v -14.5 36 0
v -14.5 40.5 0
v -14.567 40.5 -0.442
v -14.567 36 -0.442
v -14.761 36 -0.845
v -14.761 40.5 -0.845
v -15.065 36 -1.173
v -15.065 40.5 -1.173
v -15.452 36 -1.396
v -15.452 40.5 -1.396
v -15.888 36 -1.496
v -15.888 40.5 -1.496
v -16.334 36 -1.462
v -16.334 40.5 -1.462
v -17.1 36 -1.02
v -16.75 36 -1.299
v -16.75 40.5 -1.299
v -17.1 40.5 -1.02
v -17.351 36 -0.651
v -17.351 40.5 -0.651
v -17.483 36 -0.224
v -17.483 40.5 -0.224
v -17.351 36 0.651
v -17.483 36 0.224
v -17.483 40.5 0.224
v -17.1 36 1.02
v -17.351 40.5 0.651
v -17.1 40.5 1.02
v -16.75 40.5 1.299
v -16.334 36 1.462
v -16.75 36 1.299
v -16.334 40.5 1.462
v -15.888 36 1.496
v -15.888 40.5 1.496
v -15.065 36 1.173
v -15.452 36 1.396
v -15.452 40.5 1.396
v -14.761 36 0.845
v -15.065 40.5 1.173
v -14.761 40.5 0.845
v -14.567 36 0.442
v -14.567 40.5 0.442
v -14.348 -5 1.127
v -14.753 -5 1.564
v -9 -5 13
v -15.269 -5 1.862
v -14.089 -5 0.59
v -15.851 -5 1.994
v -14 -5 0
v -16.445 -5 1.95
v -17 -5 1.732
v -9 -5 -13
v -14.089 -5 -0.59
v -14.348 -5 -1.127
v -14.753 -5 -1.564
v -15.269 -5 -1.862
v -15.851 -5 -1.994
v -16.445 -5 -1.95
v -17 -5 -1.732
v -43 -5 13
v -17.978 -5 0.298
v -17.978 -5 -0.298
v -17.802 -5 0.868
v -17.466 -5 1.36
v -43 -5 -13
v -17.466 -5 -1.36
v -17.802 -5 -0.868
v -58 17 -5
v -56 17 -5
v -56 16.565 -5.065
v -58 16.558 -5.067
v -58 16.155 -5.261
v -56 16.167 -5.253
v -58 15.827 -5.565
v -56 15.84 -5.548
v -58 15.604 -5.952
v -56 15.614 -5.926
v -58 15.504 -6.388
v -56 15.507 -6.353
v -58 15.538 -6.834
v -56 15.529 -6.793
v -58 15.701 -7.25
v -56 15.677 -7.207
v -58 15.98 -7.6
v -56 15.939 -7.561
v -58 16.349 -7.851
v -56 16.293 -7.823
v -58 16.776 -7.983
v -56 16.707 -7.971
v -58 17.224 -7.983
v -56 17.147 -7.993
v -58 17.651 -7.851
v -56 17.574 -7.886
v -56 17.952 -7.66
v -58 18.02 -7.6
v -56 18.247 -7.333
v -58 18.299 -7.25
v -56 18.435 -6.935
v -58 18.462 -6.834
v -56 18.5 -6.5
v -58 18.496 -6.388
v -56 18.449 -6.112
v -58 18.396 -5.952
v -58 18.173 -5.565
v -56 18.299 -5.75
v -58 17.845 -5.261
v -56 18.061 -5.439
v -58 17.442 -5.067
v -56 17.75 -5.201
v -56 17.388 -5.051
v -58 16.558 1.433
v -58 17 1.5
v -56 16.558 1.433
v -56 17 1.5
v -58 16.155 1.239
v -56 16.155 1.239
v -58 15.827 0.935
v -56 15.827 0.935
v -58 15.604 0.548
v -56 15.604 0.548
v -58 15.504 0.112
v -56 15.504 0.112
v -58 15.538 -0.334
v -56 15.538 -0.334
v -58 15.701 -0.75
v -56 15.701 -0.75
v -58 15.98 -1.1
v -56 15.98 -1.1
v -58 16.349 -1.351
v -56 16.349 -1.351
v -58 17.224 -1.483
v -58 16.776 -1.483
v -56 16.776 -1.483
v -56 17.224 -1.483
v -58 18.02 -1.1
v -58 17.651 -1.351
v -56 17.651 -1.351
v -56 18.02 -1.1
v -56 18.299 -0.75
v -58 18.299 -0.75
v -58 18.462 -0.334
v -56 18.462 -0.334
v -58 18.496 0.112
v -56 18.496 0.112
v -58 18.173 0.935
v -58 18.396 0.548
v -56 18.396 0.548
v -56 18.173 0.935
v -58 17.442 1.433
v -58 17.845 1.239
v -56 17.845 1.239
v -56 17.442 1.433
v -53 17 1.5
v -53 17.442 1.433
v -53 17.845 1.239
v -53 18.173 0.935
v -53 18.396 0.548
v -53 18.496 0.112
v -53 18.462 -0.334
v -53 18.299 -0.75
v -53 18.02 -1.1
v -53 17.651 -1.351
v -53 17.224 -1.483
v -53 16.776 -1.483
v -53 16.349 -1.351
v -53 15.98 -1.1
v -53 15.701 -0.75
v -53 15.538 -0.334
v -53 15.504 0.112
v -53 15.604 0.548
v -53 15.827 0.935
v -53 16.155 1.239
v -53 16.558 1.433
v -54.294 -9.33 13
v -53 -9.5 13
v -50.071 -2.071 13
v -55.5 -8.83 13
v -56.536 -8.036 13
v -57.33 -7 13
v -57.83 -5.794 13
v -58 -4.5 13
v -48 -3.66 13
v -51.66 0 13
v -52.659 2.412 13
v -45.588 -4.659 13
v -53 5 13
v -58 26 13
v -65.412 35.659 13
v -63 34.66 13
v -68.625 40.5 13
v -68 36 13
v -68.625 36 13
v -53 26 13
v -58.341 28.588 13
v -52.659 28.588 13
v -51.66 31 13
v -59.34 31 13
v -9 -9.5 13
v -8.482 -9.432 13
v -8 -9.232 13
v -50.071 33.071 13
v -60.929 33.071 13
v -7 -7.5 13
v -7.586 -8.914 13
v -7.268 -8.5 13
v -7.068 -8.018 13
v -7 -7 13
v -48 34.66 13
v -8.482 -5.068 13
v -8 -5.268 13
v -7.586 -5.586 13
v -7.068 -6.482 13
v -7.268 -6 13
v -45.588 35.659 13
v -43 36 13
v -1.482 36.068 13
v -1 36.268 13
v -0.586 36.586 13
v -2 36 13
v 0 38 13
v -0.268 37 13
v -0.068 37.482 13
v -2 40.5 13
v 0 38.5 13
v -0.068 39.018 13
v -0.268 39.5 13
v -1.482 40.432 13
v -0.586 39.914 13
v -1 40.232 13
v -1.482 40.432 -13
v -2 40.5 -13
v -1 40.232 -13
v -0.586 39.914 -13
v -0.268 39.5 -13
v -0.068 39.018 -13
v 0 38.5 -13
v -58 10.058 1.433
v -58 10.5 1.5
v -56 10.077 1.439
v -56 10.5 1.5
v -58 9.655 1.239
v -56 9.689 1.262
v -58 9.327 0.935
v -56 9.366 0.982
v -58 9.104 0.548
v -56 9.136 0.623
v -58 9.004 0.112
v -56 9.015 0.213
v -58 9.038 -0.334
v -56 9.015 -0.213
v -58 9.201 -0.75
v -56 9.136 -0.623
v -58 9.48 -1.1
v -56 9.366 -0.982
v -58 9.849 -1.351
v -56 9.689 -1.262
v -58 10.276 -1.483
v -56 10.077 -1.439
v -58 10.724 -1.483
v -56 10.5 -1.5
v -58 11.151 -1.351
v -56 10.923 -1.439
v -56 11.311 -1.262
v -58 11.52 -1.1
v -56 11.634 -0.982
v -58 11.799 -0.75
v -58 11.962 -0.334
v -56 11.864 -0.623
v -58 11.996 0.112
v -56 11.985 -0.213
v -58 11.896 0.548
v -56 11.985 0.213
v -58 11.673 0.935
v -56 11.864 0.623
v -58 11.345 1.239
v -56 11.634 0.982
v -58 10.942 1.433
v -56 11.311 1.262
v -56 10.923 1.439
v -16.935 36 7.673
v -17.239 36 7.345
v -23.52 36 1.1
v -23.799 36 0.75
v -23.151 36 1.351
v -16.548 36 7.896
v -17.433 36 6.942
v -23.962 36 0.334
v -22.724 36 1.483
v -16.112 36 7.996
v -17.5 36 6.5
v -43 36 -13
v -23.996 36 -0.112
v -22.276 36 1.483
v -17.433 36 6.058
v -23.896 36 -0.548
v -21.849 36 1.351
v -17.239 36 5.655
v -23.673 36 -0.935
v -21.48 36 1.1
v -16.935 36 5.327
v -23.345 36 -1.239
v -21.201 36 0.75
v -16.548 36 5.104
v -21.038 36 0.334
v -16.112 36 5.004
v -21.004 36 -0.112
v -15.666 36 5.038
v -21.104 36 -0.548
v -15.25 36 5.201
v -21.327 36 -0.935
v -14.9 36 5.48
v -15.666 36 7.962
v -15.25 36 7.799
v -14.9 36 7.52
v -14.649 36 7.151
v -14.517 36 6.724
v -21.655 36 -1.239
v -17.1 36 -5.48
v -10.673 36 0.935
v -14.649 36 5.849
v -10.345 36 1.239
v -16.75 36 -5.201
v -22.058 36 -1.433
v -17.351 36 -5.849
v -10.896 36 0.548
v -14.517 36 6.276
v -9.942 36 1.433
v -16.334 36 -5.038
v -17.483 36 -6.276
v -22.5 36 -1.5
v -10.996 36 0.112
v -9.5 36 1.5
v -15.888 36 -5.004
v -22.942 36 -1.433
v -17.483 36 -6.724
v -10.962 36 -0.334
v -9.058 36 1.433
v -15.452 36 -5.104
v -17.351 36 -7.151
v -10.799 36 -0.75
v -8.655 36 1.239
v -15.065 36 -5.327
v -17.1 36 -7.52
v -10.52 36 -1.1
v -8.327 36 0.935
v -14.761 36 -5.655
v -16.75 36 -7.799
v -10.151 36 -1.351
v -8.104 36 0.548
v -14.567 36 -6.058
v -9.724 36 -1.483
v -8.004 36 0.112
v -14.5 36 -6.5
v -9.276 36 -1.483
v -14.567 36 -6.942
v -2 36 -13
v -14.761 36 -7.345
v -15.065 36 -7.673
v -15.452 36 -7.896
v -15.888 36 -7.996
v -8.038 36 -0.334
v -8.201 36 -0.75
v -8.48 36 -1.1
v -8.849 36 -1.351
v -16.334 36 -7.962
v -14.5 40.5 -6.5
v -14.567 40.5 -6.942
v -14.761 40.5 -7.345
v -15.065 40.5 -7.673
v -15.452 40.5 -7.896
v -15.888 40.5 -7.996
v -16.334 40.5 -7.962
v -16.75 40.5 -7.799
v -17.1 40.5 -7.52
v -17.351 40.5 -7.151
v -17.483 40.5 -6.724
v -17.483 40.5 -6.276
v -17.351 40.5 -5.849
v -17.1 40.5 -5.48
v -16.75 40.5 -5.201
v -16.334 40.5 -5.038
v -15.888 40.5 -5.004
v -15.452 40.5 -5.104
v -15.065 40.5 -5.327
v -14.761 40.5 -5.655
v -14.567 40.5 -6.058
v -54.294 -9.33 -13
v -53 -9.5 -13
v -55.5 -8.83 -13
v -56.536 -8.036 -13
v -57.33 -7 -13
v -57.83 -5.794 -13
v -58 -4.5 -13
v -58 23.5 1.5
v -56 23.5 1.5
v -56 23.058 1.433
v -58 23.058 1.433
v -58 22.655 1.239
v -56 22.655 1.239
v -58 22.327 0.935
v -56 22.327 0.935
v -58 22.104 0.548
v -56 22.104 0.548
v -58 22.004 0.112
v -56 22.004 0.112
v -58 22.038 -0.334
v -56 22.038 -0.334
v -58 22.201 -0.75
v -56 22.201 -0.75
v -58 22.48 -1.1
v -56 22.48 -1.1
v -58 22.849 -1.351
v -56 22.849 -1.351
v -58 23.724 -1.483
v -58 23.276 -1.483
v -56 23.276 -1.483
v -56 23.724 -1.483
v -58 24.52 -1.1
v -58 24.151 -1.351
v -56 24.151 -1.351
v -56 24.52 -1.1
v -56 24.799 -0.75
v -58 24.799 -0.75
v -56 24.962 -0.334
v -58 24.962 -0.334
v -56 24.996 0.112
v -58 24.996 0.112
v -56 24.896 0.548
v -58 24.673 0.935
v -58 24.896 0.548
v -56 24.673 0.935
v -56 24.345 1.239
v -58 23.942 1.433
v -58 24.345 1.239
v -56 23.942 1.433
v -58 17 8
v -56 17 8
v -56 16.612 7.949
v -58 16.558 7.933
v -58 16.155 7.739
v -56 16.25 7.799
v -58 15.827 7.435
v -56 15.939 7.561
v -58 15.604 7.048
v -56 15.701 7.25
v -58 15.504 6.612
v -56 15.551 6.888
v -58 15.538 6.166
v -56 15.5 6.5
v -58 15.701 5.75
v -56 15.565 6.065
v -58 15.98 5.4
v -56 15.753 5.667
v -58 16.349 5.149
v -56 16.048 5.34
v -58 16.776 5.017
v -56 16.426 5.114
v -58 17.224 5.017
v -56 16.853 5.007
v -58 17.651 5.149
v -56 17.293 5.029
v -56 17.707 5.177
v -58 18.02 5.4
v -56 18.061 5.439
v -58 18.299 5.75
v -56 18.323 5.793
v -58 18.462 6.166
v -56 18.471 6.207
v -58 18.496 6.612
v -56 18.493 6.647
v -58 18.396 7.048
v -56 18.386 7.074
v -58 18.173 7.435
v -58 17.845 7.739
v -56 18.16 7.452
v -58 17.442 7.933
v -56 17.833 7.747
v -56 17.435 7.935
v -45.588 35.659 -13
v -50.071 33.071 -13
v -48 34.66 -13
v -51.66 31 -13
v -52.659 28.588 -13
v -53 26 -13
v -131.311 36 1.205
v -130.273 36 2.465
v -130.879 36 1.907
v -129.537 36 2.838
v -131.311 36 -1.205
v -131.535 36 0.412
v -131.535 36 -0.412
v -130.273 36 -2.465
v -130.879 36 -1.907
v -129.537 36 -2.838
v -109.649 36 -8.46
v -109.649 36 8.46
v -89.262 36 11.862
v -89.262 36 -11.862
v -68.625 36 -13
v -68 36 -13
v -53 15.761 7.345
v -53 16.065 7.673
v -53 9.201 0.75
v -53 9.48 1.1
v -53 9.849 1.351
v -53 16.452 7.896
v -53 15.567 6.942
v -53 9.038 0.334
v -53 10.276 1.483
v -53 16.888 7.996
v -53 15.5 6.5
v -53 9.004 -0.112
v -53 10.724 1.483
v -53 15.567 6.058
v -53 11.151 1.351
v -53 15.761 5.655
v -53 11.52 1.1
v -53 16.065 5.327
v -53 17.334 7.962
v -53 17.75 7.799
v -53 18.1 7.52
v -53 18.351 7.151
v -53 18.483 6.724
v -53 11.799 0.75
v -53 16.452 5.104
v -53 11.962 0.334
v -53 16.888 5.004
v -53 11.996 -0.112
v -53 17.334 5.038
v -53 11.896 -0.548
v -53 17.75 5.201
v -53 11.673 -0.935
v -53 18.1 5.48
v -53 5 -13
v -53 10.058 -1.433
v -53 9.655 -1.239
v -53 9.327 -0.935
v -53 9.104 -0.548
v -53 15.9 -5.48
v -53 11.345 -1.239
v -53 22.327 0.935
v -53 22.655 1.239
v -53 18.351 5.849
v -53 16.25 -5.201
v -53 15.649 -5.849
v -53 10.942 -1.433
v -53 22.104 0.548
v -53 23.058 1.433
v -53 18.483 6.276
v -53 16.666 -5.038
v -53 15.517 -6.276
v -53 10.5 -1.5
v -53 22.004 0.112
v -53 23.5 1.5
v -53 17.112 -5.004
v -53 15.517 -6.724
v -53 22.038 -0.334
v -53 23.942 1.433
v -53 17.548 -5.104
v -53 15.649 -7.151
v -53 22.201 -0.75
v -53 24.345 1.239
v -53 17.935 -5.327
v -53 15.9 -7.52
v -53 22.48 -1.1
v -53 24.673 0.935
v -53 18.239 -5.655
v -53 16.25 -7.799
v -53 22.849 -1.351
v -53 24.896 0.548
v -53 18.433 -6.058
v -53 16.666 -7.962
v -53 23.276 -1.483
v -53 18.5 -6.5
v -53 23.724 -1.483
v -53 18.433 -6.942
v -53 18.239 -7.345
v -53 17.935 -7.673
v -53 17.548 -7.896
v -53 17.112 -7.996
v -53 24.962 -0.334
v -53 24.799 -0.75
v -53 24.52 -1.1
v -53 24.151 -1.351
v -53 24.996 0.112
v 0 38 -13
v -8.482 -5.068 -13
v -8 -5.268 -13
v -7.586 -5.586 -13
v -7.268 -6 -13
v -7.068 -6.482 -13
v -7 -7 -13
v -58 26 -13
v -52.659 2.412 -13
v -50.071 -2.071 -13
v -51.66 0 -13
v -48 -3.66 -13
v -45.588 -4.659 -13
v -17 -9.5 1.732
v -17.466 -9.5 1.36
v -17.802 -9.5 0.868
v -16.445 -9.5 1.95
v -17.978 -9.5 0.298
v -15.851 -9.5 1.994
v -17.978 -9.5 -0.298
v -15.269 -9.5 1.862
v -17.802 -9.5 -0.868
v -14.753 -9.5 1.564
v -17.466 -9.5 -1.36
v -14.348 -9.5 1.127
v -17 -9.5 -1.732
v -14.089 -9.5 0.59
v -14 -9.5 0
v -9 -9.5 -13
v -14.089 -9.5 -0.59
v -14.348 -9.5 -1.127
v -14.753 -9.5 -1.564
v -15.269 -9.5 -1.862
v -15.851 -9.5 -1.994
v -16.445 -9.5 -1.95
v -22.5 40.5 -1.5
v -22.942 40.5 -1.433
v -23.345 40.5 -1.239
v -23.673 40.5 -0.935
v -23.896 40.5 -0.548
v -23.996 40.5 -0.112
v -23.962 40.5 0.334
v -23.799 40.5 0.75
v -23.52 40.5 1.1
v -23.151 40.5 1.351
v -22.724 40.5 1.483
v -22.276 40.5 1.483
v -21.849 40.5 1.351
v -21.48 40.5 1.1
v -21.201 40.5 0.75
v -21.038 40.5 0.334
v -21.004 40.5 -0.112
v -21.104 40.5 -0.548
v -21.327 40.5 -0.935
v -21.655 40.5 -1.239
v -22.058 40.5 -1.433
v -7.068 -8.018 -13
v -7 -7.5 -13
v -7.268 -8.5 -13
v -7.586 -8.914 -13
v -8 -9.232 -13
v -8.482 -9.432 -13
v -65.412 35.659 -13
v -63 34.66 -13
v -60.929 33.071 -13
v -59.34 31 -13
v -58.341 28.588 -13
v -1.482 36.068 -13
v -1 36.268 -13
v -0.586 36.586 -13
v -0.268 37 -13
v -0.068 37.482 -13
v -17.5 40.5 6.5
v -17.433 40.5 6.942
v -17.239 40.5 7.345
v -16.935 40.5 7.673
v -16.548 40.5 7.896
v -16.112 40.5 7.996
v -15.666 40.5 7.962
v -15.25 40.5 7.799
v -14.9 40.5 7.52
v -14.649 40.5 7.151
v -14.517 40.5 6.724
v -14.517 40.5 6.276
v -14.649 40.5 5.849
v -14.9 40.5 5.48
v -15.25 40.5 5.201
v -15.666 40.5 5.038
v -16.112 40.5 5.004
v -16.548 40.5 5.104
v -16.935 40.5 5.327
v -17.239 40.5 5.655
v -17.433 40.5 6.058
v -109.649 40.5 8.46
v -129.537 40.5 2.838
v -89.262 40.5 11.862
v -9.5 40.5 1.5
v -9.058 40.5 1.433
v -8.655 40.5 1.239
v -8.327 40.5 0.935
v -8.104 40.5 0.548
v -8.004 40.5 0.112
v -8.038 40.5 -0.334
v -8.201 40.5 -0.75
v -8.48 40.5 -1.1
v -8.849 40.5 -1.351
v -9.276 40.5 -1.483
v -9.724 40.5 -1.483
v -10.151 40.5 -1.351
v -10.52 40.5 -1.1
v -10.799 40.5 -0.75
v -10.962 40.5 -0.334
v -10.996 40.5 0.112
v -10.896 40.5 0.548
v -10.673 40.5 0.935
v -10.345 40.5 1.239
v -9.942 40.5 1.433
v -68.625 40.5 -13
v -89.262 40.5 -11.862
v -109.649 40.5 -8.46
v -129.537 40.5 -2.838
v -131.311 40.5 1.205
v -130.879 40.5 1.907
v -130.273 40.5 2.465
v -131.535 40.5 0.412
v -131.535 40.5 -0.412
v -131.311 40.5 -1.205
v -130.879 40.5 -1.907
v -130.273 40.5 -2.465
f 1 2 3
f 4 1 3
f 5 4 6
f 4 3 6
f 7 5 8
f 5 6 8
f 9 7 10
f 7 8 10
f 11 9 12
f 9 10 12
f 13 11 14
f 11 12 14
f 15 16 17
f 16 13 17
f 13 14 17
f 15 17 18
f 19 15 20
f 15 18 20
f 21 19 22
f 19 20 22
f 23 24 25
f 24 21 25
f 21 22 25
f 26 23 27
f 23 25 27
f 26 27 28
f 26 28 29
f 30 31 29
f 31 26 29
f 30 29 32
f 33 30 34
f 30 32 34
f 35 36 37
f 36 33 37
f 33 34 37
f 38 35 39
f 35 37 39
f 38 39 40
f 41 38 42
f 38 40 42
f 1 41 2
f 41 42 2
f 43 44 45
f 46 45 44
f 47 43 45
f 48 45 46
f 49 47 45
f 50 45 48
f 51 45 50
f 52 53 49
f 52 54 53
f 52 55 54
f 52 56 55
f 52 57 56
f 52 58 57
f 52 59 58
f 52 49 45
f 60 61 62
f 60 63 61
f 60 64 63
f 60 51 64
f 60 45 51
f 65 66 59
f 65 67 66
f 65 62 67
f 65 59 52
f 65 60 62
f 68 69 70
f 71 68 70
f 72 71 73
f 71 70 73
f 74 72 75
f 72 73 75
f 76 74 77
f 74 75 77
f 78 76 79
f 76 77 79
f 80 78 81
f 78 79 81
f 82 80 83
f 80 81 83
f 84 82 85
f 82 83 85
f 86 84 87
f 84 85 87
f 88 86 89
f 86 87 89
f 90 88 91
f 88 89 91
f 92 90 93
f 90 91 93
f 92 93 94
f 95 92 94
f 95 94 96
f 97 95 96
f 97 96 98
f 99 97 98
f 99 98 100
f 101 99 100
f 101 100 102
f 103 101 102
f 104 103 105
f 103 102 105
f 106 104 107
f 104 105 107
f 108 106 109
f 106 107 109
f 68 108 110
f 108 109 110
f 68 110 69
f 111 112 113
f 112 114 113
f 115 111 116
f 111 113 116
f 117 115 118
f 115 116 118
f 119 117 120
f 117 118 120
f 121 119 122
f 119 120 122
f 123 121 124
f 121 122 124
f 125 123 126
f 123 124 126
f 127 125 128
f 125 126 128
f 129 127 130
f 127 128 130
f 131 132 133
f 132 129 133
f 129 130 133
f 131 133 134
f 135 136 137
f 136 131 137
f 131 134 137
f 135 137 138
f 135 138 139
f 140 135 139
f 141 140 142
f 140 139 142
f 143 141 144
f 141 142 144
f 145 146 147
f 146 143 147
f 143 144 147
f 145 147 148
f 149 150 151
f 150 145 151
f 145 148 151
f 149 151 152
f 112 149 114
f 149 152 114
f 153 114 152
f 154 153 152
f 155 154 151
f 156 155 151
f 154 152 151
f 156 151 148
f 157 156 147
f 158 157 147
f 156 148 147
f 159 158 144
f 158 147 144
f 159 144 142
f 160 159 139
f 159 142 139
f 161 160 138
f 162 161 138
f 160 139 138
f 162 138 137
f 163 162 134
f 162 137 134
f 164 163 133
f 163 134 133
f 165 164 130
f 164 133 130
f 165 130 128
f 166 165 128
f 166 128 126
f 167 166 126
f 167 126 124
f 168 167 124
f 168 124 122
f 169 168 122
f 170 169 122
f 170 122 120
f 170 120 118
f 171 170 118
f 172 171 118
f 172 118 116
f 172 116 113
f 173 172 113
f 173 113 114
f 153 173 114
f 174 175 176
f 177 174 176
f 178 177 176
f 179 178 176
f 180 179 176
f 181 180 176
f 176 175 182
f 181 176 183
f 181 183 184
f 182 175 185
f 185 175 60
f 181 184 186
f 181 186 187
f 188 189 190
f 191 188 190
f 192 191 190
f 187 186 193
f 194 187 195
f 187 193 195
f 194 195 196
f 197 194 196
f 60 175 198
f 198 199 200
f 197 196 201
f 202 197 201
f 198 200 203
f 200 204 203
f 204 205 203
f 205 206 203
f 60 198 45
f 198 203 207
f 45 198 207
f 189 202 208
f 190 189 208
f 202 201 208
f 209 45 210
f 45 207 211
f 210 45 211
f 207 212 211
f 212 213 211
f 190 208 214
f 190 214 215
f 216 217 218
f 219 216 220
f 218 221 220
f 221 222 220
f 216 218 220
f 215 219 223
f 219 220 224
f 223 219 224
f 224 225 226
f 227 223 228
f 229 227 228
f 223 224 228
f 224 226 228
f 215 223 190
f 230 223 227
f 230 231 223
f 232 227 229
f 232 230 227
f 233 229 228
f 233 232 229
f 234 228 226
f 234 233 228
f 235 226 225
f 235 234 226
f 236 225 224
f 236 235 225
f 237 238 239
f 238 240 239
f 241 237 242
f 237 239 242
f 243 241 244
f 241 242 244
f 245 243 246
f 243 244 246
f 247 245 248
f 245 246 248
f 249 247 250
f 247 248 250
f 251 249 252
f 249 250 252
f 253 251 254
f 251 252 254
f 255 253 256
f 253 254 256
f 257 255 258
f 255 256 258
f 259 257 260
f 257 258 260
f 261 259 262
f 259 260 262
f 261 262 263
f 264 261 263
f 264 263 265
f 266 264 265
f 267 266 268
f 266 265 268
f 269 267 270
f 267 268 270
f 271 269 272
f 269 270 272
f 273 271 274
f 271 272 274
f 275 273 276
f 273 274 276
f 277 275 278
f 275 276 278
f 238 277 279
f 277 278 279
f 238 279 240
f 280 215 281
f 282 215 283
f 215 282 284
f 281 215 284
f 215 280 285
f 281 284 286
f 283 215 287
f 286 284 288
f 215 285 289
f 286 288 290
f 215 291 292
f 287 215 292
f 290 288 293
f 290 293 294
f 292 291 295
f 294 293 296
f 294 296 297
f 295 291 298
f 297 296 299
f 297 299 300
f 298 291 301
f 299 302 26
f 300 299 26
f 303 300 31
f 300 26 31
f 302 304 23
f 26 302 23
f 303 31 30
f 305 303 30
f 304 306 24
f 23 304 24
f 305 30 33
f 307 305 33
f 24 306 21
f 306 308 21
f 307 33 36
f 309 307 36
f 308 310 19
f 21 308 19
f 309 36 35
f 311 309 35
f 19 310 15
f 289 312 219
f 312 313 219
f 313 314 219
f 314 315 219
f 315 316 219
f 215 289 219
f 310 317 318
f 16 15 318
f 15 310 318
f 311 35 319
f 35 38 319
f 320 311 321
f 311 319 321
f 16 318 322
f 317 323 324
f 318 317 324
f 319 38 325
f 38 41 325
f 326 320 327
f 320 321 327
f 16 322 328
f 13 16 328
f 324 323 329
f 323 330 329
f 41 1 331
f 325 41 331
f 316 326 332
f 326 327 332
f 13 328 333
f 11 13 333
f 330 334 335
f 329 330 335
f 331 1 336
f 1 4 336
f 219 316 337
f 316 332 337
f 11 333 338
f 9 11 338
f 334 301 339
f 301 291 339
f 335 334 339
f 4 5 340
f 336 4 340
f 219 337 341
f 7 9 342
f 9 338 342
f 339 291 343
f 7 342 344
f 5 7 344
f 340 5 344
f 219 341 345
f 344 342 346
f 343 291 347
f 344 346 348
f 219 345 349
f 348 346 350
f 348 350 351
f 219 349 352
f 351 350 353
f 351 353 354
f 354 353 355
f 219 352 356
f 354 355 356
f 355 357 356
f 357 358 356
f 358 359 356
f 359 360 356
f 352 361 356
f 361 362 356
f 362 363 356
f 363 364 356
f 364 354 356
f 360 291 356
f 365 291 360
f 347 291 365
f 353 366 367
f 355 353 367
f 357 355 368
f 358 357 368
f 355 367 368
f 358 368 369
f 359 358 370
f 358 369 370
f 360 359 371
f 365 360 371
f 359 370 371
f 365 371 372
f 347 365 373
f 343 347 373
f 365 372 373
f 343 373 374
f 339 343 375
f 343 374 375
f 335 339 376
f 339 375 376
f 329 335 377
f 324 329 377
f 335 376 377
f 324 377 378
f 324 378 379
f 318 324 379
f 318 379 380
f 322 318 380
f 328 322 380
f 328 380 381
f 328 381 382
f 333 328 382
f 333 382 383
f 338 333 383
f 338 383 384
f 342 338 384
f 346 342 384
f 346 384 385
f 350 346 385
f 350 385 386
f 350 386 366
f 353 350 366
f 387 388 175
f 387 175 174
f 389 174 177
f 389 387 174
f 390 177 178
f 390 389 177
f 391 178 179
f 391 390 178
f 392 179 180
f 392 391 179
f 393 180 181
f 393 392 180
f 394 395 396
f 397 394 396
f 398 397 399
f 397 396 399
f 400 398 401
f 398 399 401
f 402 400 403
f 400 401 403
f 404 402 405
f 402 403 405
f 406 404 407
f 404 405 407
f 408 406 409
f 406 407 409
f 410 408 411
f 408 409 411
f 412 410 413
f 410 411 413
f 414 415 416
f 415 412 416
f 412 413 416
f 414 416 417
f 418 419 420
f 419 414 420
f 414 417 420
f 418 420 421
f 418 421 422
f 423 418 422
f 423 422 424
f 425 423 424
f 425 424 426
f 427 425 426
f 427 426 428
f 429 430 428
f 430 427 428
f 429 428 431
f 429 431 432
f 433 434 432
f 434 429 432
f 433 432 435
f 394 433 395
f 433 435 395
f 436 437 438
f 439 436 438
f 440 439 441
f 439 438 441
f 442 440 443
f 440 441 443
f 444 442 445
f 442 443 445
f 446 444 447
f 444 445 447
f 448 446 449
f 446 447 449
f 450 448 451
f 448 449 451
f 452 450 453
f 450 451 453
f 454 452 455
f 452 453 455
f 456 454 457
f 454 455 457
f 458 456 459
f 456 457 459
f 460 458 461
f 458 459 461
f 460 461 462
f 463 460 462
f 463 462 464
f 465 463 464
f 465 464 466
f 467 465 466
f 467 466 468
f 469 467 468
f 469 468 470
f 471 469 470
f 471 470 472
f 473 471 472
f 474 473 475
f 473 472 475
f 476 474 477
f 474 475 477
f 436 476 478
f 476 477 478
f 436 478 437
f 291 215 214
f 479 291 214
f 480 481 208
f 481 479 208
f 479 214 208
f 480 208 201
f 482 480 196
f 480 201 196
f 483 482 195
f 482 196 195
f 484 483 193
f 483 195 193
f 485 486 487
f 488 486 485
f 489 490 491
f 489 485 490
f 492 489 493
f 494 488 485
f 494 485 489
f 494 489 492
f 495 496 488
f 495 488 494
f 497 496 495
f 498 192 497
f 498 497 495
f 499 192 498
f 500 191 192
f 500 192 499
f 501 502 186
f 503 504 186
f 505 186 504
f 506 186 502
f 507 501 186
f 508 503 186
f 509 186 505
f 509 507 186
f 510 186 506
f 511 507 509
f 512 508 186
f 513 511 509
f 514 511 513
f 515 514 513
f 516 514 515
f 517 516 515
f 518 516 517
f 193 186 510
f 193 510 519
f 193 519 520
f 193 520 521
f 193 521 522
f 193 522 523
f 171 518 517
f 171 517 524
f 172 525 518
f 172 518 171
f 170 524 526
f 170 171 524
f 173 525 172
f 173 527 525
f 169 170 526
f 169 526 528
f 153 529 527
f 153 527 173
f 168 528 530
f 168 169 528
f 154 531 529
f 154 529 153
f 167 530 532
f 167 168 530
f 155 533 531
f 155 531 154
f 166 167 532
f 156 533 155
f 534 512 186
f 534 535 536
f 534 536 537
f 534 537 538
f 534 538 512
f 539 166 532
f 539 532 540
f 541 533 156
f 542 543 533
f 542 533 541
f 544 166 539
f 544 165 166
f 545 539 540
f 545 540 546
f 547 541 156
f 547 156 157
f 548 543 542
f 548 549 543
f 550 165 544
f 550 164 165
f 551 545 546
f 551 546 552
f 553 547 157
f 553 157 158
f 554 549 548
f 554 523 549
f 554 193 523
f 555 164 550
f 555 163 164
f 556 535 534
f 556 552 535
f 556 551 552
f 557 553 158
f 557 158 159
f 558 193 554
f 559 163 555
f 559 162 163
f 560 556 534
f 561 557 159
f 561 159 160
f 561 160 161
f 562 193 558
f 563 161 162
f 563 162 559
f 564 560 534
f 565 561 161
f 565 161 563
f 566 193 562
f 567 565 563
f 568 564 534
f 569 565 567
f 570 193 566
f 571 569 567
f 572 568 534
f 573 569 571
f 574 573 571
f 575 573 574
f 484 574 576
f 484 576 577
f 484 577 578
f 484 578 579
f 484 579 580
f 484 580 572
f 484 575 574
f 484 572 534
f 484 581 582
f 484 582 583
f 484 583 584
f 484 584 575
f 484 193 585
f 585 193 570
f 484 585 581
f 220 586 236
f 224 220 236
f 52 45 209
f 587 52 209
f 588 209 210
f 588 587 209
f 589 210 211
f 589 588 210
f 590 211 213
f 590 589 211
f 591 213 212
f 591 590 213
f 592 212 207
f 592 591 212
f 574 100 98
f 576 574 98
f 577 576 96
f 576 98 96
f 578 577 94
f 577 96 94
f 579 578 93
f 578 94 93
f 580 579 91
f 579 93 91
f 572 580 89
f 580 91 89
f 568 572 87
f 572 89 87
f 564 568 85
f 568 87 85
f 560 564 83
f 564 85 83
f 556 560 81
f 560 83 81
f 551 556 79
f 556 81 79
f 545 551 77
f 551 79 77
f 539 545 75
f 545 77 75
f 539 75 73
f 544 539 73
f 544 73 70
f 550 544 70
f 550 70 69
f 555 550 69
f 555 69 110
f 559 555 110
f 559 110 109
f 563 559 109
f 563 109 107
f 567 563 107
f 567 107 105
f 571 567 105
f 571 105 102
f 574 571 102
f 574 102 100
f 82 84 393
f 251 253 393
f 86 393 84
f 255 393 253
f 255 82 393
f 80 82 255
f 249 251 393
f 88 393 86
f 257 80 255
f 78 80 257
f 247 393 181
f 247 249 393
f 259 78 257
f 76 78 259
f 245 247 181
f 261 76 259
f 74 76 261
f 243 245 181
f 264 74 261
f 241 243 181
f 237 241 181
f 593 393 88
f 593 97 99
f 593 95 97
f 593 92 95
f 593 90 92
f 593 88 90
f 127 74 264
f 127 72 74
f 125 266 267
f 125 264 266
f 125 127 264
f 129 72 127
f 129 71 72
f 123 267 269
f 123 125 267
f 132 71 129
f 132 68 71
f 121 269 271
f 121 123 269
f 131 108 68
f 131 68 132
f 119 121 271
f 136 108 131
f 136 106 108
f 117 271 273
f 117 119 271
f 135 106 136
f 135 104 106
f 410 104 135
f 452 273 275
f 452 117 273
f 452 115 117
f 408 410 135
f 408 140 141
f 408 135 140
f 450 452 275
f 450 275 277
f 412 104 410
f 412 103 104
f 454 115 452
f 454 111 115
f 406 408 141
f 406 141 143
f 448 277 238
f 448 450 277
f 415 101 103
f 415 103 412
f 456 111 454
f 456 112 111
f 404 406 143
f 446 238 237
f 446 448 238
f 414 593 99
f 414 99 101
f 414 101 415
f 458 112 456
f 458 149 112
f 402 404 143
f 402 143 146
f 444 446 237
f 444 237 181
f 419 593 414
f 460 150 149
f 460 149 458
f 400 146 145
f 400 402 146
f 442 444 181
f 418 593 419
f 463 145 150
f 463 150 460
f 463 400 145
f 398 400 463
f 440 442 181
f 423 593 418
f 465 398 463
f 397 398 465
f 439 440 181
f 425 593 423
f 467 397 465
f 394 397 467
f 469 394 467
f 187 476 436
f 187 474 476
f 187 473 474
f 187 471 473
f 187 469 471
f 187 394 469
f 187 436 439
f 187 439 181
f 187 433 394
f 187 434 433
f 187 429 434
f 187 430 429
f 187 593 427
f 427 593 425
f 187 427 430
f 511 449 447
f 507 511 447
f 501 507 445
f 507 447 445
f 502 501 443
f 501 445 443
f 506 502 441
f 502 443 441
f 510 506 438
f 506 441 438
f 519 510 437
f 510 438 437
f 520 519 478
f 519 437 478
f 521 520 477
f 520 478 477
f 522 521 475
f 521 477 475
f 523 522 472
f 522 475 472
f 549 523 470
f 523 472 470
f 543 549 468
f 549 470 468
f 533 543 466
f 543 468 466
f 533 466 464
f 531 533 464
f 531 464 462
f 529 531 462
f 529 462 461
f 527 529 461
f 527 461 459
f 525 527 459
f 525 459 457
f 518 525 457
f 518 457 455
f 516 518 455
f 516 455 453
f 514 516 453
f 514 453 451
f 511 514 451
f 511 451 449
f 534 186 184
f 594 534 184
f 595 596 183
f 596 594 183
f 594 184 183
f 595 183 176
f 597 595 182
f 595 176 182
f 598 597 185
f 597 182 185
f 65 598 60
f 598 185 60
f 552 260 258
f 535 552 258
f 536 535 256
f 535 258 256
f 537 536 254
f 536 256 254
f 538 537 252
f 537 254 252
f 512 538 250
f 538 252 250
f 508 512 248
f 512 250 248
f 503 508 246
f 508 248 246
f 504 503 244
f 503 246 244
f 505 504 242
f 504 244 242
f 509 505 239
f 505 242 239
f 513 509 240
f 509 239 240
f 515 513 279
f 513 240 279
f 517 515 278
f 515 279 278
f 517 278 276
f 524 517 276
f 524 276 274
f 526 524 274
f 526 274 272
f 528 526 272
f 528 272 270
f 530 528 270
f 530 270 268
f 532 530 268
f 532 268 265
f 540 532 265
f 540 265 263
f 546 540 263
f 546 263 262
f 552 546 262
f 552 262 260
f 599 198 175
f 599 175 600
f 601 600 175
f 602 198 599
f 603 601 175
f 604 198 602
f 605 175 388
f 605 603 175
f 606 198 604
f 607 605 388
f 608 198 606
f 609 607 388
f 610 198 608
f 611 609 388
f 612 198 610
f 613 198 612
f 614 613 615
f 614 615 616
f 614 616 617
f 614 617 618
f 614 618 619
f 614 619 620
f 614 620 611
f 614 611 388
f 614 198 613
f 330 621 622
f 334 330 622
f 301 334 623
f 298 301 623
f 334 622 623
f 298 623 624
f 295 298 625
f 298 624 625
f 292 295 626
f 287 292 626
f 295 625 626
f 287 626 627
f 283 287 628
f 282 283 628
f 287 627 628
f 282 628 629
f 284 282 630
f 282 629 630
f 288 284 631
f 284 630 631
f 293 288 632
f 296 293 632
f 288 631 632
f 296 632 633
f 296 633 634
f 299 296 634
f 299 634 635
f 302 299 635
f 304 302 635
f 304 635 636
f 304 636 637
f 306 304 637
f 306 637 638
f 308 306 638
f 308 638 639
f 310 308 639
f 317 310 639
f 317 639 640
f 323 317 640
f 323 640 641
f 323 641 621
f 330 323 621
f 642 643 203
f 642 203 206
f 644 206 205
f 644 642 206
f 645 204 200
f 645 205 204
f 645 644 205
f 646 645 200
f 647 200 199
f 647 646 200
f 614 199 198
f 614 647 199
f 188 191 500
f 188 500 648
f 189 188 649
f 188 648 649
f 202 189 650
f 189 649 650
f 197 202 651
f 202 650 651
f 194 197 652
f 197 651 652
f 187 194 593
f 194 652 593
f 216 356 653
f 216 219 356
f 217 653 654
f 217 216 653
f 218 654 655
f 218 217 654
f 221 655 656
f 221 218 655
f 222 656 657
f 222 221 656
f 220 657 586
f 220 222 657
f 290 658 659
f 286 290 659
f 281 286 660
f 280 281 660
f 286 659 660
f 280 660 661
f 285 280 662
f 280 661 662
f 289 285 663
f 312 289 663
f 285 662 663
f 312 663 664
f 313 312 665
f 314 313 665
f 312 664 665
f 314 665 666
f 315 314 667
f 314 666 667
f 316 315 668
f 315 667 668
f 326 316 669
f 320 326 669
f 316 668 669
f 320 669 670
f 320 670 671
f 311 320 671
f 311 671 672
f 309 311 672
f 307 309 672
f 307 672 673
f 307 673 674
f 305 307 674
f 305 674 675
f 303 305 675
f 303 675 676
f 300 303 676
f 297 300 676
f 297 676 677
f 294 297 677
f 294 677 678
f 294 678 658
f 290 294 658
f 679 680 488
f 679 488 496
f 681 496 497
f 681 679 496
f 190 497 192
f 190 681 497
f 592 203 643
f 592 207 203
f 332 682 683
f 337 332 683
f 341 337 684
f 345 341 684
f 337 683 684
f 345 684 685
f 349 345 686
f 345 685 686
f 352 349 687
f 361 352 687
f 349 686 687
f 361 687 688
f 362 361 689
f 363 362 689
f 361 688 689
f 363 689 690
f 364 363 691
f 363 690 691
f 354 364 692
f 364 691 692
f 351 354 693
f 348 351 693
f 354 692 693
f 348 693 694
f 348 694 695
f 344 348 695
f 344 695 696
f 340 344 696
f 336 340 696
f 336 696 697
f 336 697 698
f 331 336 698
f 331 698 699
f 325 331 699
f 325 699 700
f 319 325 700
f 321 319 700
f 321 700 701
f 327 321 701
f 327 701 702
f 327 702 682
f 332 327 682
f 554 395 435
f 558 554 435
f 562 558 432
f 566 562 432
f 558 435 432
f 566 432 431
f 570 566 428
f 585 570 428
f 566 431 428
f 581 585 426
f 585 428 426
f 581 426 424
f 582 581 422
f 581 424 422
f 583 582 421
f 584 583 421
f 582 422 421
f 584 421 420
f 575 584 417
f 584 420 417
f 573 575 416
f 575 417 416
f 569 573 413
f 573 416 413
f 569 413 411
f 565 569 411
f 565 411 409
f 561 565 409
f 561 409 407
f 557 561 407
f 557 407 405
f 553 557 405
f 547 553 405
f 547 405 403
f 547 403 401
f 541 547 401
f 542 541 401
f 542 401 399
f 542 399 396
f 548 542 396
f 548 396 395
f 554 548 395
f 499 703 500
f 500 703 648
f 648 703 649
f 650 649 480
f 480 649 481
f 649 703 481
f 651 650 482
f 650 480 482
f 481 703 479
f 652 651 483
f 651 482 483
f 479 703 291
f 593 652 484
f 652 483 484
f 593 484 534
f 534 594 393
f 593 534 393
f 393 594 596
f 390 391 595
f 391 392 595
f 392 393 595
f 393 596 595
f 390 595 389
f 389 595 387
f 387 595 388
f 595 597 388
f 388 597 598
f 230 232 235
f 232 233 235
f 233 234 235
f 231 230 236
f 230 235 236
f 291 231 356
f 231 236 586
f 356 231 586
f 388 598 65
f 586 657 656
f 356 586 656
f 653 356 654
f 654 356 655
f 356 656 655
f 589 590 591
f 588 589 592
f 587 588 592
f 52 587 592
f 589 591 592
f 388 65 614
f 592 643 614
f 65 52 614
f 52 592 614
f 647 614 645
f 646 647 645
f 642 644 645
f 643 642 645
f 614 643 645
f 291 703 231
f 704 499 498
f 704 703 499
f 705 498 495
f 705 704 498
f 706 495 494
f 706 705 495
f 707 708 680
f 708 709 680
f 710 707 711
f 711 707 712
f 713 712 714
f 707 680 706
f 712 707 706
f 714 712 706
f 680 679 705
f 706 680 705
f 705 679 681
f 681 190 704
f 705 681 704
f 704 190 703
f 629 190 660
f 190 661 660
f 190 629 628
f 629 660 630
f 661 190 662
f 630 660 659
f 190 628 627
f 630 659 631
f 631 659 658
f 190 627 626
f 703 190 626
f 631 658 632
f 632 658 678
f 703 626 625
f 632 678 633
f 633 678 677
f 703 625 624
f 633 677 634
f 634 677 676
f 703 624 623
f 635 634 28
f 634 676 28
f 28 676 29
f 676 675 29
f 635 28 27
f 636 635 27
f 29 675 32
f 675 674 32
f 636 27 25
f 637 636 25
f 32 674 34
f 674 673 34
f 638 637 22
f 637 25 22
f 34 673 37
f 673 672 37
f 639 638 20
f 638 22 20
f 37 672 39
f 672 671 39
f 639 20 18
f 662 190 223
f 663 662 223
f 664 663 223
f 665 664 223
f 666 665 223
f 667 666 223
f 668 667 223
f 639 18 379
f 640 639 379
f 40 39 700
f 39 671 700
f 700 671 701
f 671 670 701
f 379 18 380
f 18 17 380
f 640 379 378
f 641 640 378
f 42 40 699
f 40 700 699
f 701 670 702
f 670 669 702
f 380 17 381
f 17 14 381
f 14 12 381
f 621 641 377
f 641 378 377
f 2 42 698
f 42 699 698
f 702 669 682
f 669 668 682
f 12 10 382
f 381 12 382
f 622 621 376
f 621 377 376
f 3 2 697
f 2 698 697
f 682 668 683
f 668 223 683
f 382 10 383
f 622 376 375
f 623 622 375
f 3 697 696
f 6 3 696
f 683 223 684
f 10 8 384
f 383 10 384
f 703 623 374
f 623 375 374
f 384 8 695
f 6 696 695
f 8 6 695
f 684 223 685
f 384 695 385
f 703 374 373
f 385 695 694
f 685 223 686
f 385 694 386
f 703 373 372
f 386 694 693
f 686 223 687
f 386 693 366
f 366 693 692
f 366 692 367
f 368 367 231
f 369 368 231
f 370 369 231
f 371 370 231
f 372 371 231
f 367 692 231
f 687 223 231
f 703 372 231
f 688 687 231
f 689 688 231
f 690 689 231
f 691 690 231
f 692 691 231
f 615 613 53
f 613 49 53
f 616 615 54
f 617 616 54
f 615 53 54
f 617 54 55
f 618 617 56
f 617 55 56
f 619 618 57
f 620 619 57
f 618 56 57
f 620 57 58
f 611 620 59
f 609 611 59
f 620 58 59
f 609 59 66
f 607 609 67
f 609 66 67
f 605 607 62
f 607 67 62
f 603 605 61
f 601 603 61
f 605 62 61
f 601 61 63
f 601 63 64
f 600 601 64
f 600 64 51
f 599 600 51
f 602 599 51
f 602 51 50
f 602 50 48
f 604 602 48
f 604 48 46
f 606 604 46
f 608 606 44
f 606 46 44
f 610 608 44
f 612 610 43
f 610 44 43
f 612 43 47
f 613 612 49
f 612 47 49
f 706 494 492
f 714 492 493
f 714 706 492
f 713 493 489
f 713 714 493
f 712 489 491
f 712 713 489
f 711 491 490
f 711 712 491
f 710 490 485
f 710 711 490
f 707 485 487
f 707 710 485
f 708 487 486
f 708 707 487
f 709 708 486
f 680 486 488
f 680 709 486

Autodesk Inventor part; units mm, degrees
ref_plane "YZ Plane" through (0, 0, 0) normal (1, 0, 0) x (0, 1, 0)
sketch "Sketch1" plane through (0, 0, 0) normal (0, 0, 1) x (1, 0, 0)
  line L0 (0, 0) -> (-53, 0)
  line L1 (-53, 0) -> (-53, 18)
  line L2 (-53, 18) -> (0, 18) construction
  line L3 (-53, 18) -> (-56, 18)
  line L4 (-56, 18) -> (-56, -3)
  line L5 (-56, -3) -> (0, -3)
  line L6 (0, -3) -> (0, 0)
  dimension "d0" = 18
  dimension "d1" = 3
  dimension "d2" = 3
  dimension "d3" = 56
extrude "Extrusion1" add sketch "Sketch1" along normal blind 10
mirror "Mirror1" about plane through (-34.1948, 1.3052, 0) normal (0, 0, -1) of "Extrusion1"
mirror "Mirror2" about plane through (-53, 18, 0) normal (0, 1, 0) of "Extrusion1", "Mirror1"
sketch "Sketch4" plane through (0, -3, -10) normal (0, 0, -1) x (-1, 0, 0)
  line L0 (0, 3) -> (53, 3) projected
  line L1 (0, 0) -> (0, 3) projected
  line L2 (56, 0) -> (0, 0) projected
  line L3 (56, 42) -> (56, 0) projected
  line L4 (56, 42) -> (0, 42) projected
  line L5 (0, 42) -> (0, 39) projected
  line L6 (0, 39) -> (53, 39) projected
  line L7 (53, 39) -> (53, 3) projected
  line L8 (0, 3) -> (53, 3) projected
  line L9 (0, 0) -> (0, 3) projected
  line L10 (56, 0) -> (0, 0) projected
  line L11 (56, 42) -> (56, 0) projected
  line L12 (56, 42) -> (0, 42) projected
  line L13 (0, 42) -> (0, 39) projected
  line L14 (0, 39) -> (53, 39) projected
  line L15 (53, 39) -> (53, 3) projected
extrude "Extrusion4" add sketch "Sketch4" along normal blind 5
mirror "Mirror3" about plane through (0, 0, 0) normal (0, 0, 1) of "Extrusion4"
sketch "Sketch11" plane through (-56, -3, -15) normal (0, -1, 0) x (1, 0, 0)
  line L0 (56, 0) -> (56, 30) projected
  line L1 (56, 30) -> (0, 30) projected
  line L2 (0, 0) -> (0, 30) projected
  line L3 (56, 0) -> (0, 0) projected
  line L4 (56, 0) -> (56, 30) projected
  line L5 (56, 30) -> (0, 30) projected
  line L6 (0, 0) -> (0, 30) projected
  line L7 (56, 0) -> (0, 0) projected
  point P0 (56, 15)
extrude "Extrusion11" cut sketch "Sketch11" against normal blind 10
sketch "Sketch13" plane through (0, 36, -15) normal (1, 0, 0) x (0, 0, -1)
  line L0 (-30, 3) -> (-28, 3)
  line L1 (-28, 3) -> (-28, -29)
  line L2 (-28, -29) -> (-30, -29)
  line L3 (-30, -29) -> (-30, 3)
  line L4 (-30, -29) -> (0, -29) projected
  point P0 (-15, -36)
  dimension "d65" = 2
extrude "Extrusion13" cut sketch "Sketch13" against normal up to next
mirror "Mirror4" about plane through (0, 0, 0) normal (0, 0, 1) of "Extrusion13"
sketch "Sketch14" plane through (-56, 7, 13) normal (-1, 0, 0) x (0, 0, 1)
  line L0 (-26, 32) -> (-26, 0) projected
  line L1 (-26, 0) -> (0, 0) projected
  line L2 (0, 32) -> (-26, 32) projected
  circle A0 centre (-13, 10) radius 6.5 construction
  line L3 (-13, 10) -> (-26, 10) construction
  line L4 (-13, 10) -> (-13, 32) construction
  circle A1 centre (-13, 10) radius 1.5
  circle A2 centre (-13, 16.5) radius 1.5
  point P0 (-13, -7)
  point P1 (-13, 0)
  dimension "d68" = 13
  dimension "d69" = 22
  dimension "d71" = 3
  dimension "d72" = 3
extrude "Extrusion14" cut sketch "Sketch14" against normal up to next
pattern_circular "Circular Pattern6" count 4 over 360 about axis through (-56, 17, 0) along (1, 0, 0) of "Extrusion14"
sketch "Sketch15" plane through (-53, 36, 13) normal (0, -1, 0) x (1, 0, 0)
  line L0 (53, -26) -> (53, 0) projected
  line L1 (53, 0) -> (0, 0) projected
  circle A0 centre (37, -13) radius 6.5 construction
  line L2 (37, -13) -> (37, 0) construction
  circle A1 centre (37, -6.5) radius 1.5
  circle A2 centre (37, -13) radius 1.5
  point P0 (53, -13)
  point P1 (53, -13)
  dimension "d78" = 13
  dimension "d79" = 16
  dimension "d80" = 3
  dimension "d81" = 3
extrude "Extrusion15" cut sketch "Sketch15" against normal up to next
pattern_circular "Circular Pattern7" count 4 over 360 about axis through (-16, 36, 0) along (0, 1, 0) of "Extrusion15"
sketch "Sketch16" plane through (-56, 7, -15) normal (0, -1, 0) x (1, 0, 0)
  line L0 (0, 2) -> (3, 2) projected
  line L1 (3, 28) -> (3, 2) projected
  line L2 (3, 28) -> (0, 28) projected
  line L3 (0, 2) -> (0, 28) projected
  line L4 (0, 2) -> (3, 2) projected
  line L5 (3, 28) -> (3, 2) projected
  line L6 (3, 28) -> (0, 28) projected
  line L7 (0, 2) -> (0, 28) projected
  point P0 (56, 15)
extrude "Extrusion16" add sketch "Sketch16" along normal blind 14
ref_plane "Work Plane1" through (-47, 34, 13) normal (1, 0, 0) x (0, 0, -1)
sketch "Sketch17" plane through (-47, 34, 13) normal (1, 0, 0) x (0, 0, -1)
  line L0 (0, 0) -> (0, -41) projected
  line L1 (26, -41) -> (0, -41)
  line L2 (0, -41) -> (0, -39)
  line L3 (0, -39) -> (26, -39)
  line L4 (26, -39) -> (26, -41)
  point P0 (13, -34)
  dimension "d92" = 2
extrude "Extrusion17" add sketch "Sketch17" along normal blind 40
ref_plane "Work Plane3" through (-47, -5, 13) normal (0, 1, 0) x (1, 0, 0)
sketch "Sketch18" plane through (-47, -5, 13) normal (0, 1, 0) x (1, 0, 0)
  circle A0 centre (31, 13) radius 1.5 projected
  circle A1 centre (31, 13) radius 2
  point P0 (47, 13)
  dimension "d95" = 4
extrude "Extrusion18" cut sketch "Sketch18" against normal up to next contours A0 | A1
sketch "Sketch23" plane through (0, 36, 13) normal (0, 0, 1) x (1, 0, 0)
  line L0 (0, 0) -> (-53, 0) projected
  line L1 (-56, 3) -> (0, 3) projected
  line L2 (-56, -43) -> (-56, 3) projected
  line L3 (-7, -43) -> (-56, -43) projected
  line L4 (-47, -41) -> (-7, -41) projected
  line L5 (-53, 0) -> (-53, -43) projected
  line L6 (0, 0) -> (-53, 0) projected
  line L7 (0, 3) -> (0, 0) projected
  line L8 (-56, 3) -> (0, 3) projected
  line L9 (-56, -43) -> (-56, 3) projected
  line L10 (-53, -43) -> (-56, -43) projected
  line L11 (0, 0) -> (-56, 0)
  line L12 (-56, 0) -> (-56, 4.5)
  line L13 (-56, 4.5) -> (0, 4.5)
  line L14 (0, 4.5) -> (0, 0)
  line L15 (-7, -41) -> (-56, -41)
  line L16 (-56, -41) -> (-56, -45.5)
  line L17 (-56, -45.5) -> (-7, -45.5)
  line L18 (-7, -45.5) -> (-7, -41)
  point P0 (0, -36)
  dimension "d110" = 3
  dimension "d111" = 2
  dimension "d112" = 1.5
  dimension "d113" = 2.5
sketch "Sketch24" plane through (-56, 39, 13) normal (0, 1, 0) x (1, 0, 0)
  circle A0 centre (40, 19.5) radius 1.5 projected
  circle A1 centre (46.5, 13) radius 1.5 projected
  circle A2 centre (33.5, 13) radius 1.5 projected
  circle A3 centre (40, 6.5) radius 1.5 projected
  circle A4 centre (40, 13) radius 1.5 projected
  line L0 (56, 26) -> (0, 26) projected
  line L1 (0, 0) -> (0, 26) projected
  line L2 (0, 0) -> (56, 0) projected
  line L3 (56, 0) -> (56, 26) projected
  point P0 (56, 13)
  dimension "d114" = 26
extrude "Extrusion22" add sketch "Sketch23" against normal up to surface (26 mm away) contours L0 L11 L2 L1 L7 | L1 L12 L13 L14 | L15 L4 L18 L3 L5 | L5 L3 L2 L15 | L3 L18 L17 L16
sketch "Sketch25" plane through (-53, 36, 13) normal (0, 0, 1) x (1, 0, 0)
  line L0 (-3, 4.5) -> (-3, -45.5) projected
  line L1 (-3, -45.5) -> (46, -45.5) projected
  line L2 (46, -41) -> (46, -45.5) projected
  line L3 (46, -41) -> (0, -41) projected
  line L4 (0, 0) -> (0, -41) projected
  line L5 (53, 0) -> (0, 0) projected
  line L6 (53, 4.5) -> (53, 0) projected
  line L7 (53, 4.5) -> (-3, 4.5) projected
  point P0 (53, -36)
  dimension "d117" = 3
sketch "Sketch26" plane through (-56, -9.5, -13) normal (-1, 0, 0) x (0, 0, 1)
  line L0 (0, 0) -> (0, 50) projected
  line L1 (26, 0) -> (0, 0) projected
  line L2 (26, 50) -> (26, 0) projected
  line L3 (26, 50) -> (0, 50) projected
  circle A0 centre (13, 20) radius 1.5 projected
  circle A1 centre (19.5, 26.5) radius 1.5 projected
  circle A2 centre (6.5, 26.5) radius 1.5 projected
  circle A3 centre (13, 26.5) radius 1.5 projected
  circle A4 centre (13, 33) radius 1.5 projected
  line L4 (0, 0) -> (0, 50) projected
  line L5 (26, 0) -> (0, 0) projected
  line L6 (26, 50) -> (26, 0) projected
  circle A5 centre (13, 20) radius 1.5 projected
  circle A6 centre (19.5, 26.5) radius 1.5 projected
  circle A7 centre (6.5, 26.5) radius 1.5 projected
  circle A8 centre (13, 26.5) radius 1.5 projected
  circle A9 centre (13, 33) radius 1.5 projected
  line L7 (26, 50) -> (0, 50) projected
  point P0 (13, 9.5)
extrude "Extrusion23" add sketch "Sketch26" along normal blind 2
sketch "Sketch27" plane through (0, 40.5, 13) normal (0, 1, 0) x (1, 0, 0)
  line L0 (-58, 26) -> (0, 26) projected
  line L1 (0, 0) -> (0, 26) projected
  circle A0 centre (-16, 13) radius 6.5 construction
  circle A1 centre (-16, 19.5) radius 1.5
  circle A2 centre (-16, 13) radius 1.5
  line L2 (-16, 13) -> (0, 13) construction
  line L3 (-16, 13) -> (-16, 26) construction
  dimension "d121" = 13
  dimension "d120" = 3
  dimension "d122" = 3
  dimension "d123" = 16
extrude "Extrusion24" cut sketch "Sketch27" against normal up to surface (4.5 mm away)
pattern_circular "Circular Pattern8" count 4 over 360 about axis through (-16, 40.5, 0) along (0, -1, 0) of "Extrusion24"
sketch "Sketch28" plane through (-53, -5, 13) normal (0, 1, 0) x (1, 0, 0)
  circle A0 centre (37, 13) radius 1.5 projected
  circle A1 centre (37, 13) radius 2
  point P0 (53, 13)
  dimension "d129" = 4
extrude "Extrusion25" cut sketch "Sketch28" against normal up to next contours A0 | A1
sketch "Sketch29" plane through (-58, -9.5, -13) normal (-1, 0, 0) x (0, 0, 1)
  line L0 (0, 50) -> (0, 0) projected
  line L1 (26, 0) -> (26, 50) projected
  line L2 (26, 50) -> (0, 50) projected
  line L3 (26, 45.5) -> (0, 45.5) projected
  point P0 (13, 9.5)
extrude "Extrusion26" add sketch "Sketch29" along normal blind 79.25
sketch "Sketch30" plane through (0, 40.5, 13) normal (0, 1, 0) x (1, 0, 0)
  line L0 (-137.25, 26) -> (0, 26) projected
  line L1 (-137.25, 0) -> (-137.25, 26) projected
  line L2 (0, 0) -> (-137.25, 0) projected
  arc A0 (-137.25, 13) -> (-68.625, 0) centre (-68.625, 187.6304) ccw
  arc A1 (-68.625, 26) -> (-137.25, 13) centre (-68.625, -161.6304) ccw
  point P0 (0, 13)
extrude "Extrusion27" cut sketch "Sketch30" against normal up to next
fillet "Fillet9" radius 3 1 edges at (-137.25, 38.25, 0)
fillet "Fillet10" radius 10 1 edges at (-58, 36, 0)
fillet "Fillet11" radius 10 1 edges at (-53, 36, 0)
fillet "Fillet12" radius 5 1 edges at (-58, -9.5, 0)
fillet "Fillet13" radius 2 4 edges at (0, 40.5, 0) (0, 36, 0) (-7, -9.5, 0) (-7, -5, 0)
fillet "Fillet14" radius 10 1 edges at (-53, -5, 0)
equation "\"d72\" = d71"
properties part number "CLAW"
